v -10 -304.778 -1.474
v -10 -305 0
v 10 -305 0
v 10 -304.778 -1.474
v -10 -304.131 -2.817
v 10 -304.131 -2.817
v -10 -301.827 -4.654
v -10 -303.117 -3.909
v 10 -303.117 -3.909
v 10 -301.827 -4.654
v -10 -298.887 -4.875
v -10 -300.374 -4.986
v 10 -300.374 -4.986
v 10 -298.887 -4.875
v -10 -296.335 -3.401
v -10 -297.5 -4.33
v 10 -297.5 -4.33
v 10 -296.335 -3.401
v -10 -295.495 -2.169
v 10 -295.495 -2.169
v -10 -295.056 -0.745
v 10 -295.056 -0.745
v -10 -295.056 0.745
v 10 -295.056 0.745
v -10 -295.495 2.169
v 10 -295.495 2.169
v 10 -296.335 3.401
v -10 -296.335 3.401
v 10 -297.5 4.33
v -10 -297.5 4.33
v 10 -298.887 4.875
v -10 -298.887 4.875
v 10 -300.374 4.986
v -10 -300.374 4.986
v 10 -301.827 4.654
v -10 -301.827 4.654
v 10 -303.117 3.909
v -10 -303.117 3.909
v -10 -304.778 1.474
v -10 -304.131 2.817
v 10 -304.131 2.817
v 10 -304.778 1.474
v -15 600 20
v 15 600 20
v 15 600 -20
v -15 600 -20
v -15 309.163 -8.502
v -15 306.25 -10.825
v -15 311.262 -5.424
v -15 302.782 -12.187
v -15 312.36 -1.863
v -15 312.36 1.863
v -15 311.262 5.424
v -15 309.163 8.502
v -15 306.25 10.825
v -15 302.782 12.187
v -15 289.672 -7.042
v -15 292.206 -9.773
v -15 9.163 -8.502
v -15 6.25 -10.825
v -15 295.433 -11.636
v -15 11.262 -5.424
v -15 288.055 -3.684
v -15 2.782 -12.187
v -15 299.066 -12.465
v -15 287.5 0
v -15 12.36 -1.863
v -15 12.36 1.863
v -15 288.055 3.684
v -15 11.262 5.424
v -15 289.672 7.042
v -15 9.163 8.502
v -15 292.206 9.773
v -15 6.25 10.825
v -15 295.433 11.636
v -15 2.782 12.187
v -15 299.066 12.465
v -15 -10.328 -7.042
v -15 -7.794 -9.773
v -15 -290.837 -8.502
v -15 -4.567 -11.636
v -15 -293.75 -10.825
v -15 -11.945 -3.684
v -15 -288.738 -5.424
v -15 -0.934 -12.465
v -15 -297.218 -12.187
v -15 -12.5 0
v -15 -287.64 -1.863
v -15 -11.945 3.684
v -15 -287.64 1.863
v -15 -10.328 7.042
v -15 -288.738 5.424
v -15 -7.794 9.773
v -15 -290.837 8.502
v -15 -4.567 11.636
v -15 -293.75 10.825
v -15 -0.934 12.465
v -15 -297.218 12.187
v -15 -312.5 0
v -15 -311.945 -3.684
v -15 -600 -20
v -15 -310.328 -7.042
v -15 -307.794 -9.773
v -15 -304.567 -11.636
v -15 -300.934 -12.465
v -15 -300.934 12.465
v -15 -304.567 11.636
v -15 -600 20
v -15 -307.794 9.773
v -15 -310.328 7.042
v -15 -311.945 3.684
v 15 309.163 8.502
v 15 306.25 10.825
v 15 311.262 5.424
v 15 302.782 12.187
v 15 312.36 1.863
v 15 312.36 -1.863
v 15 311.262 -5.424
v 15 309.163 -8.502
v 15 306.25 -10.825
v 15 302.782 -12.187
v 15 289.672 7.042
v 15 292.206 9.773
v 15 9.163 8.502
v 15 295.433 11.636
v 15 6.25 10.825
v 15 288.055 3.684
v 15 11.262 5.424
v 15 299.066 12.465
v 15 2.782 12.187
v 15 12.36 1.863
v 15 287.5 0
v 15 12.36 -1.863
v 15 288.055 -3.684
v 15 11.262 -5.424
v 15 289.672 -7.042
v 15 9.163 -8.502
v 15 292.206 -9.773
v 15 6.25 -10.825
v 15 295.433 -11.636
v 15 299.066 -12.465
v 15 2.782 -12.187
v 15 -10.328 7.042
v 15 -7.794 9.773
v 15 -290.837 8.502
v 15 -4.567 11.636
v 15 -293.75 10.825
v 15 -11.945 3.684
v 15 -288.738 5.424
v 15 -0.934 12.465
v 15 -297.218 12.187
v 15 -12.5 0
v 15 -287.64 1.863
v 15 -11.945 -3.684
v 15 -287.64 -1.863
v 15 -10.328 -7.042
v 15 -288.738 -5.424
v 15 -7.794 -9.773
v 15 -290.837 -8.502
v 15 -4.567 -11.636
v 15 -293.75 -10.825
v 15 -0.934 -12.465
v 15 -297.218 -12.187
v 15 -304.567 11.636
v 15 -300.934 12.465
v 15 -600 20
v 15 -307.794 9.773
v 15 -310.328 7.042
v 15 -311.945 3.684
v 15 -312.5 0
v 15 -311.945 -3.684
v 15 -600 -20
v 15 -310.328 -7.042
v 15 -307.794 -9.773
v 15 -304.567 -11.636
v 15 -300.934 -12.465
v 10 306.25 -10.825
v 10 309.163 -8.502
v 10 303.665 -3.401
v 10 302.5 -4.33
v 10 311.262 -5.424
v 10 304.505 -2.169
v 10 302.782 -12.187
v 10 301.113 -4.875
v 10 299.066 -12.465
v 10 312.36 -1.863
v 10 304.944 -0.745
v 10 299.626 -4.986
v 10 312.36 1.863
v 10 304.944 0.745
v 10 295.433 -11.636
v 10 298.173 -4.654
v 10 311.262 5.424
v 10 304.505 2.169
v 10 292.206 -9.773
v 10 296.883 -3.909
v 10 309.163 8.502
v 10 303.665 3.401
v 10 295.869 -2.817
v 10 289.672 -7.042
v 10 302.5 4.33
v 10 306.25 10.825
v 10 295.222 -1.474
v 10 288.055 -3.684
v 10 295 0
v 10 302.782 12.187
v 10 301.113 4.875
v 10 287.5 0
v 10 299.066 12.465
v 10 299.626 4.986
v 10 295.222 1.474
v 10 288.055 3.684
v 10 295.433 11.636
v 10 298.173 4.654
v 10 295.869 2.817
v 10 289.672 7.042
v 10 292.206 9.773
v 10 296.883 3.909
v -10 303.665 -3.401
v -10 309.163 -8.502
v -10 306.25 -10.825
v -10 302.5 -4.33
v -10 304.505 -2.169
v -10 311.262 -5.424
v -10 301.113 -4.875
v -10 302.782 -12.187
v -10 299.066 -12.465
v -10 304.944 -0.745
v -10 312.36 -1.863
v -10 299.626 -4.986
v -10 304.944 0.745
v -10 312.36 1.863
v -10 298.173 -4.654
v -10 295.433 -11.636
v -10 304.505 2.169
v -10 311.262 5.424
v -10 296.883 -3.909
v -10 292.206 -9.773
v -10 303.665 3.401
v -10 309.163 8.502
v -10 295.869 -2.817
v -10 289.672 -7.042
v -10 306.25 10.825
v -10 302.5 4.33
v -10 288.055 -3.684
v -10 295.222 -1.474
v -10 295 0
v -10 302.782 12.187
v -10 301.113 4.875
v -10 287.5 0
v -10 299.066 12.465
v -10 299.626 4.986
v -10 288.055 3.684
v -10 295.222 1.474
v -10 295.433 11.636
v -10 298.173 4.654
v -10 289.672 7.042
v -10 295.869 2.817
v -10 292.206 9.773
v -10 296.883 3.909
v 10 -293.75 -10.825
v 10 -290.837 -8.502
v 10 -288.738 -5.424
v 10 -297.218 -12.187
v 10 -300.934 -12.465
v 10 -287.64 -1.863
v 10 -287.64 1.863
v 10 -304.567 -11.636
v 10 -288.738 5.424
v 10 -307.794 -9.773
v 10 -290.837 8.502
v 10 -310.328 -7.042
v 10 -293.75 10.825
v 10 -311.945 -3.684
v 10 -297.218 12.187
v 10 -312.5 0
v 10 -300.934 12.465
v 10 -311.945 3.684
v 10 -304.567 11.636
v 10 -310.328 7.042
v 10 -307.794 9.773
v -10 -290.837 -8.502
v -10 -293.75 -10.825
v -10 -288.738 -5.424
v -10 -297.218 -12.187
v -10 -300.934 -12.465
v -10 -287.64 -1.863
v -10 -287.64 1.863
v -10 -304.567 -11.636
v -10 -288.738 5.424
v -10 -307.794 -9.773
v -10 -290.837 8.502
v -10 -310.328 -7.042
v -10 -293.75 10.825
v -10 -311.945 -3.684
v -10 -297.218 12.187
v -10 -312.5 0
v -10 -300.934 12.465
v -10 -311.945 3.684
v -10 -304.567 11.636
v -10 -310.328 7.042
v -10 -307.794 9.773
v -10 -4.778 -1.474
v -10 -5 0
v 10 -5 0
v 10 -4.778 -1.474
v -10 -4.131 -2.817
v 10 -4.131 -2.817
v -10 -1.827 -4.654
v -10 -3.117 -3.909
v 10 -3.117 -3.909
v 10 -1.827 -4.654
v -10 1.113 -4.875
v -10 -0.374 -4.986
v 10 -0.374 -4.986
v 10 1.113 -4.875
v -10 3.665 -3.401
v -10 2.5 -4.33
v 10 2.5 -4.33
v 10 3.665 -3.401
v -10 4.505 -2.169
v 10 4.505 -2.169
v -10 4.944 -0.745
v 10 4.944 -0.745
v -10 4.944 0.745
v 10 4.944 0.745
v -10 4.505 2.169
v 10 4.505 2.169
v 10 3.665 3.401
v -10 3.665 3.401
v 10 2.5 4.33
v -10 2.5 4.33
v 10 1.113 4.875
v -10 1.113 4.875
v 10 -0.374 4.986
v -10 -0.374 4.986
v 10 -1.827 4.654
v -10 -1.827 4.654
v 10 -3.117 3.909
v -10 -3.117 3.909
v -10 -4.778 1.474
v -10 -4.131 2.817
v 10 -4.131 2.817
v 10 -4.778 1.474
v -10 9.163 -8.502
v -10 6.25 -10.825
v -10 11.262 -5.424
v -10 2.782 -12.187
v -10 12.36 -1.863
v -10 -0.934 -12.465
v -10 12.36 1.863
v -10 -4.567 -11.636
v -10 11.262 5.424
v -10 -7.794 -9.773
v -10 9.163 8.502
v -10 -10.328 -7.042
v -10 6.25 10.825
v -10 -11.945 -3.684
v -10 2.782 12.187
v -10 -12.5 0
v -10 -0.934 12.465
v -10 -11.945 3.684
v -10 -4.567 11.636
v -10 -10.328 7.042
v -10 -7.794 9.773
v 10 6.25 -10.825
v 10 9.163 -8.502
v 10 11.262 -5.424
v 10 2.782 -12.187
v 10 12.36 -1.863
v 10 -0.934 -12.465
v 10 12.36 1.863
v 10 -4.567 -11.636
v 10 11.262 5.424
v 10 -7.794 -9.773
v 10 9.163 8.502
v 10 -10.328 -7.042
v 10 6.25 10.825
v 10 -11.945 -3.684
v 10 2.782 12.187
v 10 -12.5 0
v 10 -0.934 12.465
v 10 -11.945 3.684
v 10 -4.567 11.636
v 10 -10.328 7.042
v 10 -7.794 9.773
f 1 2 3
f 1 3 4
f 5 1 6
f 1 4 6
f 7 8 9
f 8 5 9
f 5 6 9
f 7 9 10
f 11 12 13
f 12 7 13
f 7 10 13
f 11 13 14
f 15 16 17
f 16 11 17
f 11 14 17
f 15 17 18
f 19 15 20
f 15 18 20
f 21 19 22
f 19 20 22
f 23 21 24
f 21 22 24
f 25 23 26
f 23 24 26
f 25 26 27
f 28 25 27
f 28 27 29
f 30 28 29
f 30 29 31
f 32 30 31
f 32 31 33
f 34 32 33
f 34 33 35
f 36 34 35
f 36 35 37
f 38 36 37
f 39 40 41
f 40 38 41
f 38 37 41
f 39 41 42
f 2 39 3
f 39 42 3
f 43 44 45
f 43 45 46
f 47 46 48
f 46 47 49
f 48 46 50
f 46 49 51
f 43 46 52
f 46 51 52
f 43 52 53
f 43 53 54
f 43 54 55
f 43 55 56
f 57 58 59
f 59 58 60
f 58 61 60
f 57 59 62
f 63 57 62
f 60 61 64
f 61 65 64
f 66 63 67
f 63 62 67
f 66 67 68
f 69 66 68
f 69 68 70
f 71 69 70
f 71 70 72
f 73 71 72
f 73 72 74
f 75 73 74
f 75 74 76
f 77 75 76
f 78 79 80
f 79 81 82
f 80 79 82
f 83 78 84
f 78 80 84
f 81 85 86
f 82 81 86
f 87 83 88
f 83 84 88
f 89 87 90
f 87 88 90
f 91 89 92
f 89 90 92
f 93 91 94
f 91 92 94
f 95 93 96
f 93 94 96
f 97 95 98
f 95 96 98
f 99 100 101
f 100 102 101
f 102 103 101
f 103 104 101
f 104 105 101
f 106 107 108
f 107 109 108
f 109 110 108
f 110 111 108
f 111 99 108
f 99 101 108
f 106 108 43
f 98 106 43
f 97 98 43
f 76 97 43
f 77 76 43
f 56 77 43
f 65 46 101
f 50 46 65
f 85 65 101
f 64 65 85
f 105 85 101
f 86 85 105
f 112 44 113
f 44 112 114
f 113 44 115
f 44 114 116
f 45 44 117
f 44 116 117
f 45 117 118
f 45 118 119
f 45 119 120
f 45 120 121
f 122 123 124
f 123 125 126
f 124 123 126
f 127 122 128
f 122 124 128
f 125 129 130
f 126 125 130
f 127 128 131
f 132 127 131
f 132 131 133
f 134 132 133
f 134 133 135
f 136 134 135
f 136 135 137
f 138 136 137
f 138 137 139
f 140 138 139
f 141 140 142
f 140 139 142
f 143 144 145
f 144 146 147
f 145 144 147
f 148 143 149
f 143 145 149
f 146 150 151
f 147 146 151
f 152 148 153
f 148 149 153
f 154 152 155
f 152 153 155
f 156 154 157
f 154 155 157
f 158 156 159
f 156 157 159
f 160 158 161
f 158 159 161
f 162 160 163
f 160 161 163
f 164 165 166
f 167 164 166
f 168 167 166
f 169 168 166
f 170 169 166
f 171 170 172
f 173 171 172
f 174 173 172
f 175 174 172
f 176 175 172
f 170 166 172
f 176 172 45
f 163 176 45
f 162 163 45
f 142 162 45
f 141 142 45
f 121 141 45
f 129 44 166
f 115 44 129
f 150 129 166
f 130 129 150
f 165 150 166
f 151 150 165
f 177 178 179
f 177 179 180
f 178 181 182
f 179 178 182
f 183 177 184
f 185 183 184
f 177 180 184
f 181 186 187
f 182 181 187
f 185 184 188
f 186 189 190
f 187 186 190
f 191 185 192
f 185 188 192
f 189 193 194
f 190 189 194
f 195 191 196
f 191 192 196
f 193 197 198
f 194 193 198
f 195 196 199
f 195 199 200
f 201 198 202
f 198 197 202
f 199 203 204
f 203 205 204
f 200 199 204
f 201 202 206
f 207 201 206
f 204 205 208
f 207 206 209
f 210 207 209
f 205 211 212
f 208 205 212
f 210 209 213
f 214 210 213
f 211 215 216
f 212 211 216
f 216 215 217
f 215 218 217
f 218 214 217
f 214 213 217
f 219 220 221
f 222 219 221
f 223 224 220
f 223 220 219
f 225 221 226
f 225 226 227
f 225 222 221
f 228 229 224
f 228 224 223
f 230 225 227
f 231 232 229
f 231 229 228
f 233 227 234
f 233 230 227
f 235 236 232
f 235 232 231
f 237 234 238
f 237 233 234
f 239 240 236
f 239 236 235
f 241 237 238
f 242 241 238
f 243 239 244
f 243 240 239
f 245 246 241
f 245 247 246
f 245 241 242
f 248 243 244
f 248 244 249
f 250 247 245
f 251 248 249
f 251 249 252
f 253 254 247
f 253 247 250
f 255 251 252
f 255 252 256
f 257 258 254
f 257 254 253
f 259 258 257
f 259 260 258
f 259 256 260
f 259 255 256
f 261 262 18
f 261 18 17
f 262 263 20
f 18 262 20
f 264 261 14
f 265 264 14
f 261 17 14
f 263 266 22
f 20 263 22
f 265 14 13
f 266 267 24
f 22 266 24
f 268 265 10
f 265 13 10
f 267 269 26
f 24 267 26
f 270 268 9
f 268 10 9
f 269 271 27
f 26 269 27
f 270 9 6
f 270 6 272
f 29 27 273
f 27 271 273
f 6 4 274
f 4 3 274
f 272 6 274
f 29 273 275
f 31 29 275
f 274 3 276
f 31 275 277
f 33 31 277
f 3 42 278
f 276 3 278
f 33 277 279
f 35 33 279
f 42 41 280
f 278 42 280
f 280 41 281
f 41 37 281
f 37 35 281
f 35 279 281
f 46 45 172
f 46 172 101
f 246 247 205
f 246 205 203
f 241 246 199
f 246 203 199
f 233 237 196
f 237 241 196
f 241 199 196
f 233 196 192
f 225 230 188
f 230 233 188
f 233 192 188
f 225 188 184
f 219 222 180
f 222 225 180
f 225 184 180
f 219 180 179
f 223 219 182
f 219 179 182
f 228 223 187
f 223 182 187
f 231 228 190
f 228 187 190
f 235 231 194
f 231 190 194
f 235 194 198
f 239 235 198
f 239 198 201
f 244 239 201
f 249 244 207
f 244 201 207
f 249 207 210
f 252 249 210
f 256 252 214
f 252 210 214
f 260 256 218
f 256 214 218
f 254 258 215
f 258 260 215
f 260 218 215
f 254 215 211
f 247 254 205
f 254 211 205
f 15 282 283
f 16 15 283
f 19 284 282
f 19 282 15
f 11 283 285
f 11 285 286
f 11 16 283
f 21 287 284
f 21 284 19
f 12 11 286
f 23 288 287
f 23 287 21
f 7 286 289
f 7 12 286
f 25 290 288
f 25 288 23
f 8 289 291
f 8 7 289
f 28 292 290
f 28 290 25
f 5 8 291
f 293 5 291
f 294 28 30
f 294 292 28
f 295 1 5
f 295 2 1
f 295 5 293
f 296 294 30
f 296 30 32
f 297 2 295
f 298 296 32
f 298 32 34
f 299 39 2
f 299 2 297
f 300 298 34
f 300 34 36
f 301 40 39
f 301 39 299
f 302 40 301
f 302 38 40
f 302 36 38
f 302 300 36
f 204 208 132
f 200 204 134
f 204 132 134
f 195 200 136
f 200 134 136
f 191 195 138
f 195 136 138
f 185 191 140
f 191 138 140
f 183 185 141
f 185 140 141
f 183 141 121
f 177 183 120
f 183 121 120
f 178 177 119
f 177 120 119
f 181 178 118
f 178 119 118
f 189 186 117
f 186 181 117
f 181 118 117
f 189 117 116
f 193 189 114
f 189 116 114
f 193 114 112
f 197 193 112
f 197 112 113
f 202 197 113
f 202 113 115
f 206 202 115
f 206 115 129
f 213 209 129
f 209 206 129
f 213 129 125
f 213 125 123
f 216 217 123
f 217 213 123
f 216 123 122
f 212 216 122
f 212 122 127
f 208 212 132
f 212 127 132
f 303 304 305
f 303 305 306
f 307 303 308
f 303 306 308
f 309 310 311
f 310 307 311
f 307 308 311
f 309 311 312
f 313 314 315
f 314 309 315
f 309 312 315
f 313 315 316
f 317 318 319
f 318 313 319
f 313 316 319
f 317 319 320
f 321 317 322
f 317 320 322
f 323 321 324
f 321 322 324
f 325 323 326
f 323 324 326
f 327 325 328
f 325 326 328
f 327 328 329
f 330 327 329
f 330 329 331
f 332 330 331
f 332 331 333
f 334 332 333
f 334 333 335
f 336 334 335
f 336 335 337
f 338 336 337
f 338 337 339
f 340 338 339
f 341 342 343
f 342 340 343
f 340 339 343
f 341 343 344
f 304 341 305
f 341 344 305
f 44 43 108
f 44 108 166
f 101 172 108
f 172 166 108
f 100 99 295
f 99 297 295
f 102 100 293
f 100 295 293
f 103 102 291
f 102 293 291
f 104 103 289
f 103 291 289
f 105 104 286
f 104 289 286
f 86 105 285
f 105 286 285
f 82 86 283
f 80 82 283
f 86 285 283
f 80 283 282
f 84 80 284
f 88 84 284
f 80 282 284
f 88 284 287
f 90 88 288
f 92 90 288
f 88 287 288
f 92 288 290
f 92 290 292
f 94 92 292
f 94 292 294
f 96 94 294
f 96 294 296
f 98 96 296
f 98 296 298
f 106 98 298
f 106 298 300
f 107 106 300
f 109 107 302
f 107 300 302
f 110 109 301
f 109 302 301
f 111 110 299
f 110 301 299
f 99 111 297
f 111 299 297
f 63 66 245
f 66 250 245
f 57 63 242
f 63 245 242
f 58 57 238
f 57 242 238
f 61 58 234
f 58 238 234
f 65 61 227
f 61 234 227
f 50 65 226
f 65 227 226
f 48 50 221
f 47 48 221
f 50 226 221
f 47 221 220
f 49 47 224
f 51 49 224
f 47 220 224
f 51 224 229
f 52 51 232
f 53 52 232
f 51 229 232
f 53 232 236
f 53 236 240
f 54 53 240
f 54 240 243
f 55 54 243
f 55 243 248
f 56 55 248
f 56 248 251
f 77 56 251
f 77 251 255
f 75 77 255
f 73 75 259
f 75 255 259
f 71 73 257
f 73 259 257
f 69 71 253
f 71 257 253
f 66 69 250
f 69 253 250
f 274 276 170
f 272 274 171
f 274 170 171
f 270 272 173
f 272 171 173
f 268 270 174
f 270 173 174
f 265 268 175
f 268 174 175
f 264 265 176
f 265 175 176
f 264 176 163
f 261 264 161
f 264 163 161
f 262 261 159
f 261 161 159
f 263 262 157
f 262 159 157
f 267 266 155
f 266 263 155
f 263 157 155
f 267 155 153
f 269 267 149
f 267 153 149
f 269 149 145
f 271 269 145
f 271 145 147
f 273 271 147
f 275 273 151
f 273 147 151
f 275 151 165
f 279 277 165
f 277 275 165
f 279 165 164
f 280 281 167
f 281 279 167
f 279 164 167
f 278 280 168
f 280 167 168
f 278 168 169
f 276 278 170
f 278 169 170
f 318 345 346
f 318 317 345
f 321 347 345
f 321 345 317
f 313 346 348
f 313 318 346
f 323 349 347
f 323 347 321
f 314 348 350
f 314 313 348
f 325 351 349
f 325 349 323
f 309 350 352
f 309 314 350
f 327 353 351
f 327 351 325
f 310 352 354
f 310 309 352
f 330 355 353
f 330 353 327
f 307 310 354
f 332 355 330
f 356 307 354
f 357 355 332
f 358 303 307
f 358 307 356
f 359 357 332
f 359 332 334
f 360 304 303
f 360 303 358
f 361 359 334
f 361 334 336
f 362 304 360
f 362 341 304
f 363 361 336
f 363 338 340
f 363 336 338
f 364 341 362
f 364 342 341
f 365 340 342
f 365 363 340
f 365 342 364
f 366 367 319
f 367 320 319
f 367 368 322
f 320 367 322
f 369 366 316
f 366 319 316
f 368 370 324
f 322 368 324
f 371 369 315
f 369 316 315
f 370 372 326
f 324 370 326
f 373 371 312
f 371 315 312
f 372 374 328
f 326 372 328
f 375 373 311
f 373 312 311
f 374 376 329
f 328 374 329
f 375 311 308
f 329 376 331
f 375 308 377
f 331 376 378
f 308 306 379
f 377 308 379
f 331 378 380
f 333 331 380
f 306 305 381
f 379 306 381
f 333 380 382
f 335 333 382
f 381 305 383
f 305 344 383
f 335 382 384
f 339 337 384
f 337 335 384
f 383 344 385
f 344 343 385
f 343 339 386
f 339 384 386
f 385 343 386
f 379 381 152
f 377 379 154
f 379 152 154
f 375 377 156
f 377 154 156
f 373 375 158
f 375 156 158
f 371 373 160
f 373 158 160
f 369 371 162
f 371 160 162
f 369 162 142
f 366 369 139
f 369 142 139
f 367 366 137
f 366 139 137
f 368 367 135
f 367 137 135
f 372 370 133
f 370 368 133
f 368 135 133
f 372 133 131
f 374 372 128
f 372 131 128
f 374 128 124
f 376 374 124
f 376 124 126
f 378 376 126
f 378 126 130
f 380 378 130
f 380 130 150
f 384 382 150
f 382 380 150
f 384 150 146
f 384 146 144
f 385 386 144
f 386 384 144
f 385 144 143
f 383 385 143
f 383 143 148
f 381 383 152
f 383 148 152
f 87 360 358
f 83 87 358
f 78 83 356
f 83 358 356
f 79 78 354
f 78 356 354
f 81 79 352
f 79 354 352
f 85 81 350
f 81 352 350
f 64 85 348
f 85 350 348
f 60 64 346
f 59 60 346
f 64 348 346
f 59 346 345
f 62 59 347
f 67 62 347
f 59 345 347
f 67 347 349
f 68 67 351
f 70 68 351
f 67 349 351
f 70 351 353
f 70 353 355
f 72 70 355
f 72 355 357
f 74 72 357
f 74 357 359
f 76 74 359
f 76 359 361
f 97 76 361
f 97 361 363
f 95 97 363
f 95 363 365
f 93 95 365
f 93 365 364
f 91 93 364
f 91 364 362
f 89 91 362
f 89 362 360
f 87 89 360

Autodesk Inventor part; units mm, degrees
ref_plane "YZ Plane" through (0, 0, 0) normal (1, 0, 0) x (0, 1, 0)
ref_plane "XZ Plane" through (0, 0, 0) normal (0, 1, 0) x (-1, 0, 0)
ref_plane "XY Plane" through (0, 0, 0) normal (0, 0, 1) x (1, 0, 0)
sketch "Sketch1" plane through (0, 0, 0) normal (0, 1, 0) x (-1, 0, 0)
  line L0 (15, 20) -> (-15, 20)
  line L1 (-15, 20) -> (-15, -20)
  line L2 (-15, -20) -> (15, -20)
  line L3 (15, -20) -> (15, 20)
  point P0 (0, 0)
  point P1 (15, 0)
  point P2 (0, -20)
  dimension "d0" = 40
  dimension "d1" = 30
extrude "Extrusion1" add sketch "Sketch1" along normal mid plane 1200
sketch "Sketch2" plane through (0, 0, 0) normal (0, 0, 1) x (1, 0, 0)
  line L0 (35, 0) -> (-35, 0)
  line L1 (-35, 0) -> (-35, -12.5)
  line L2 (-35, -12.5) -> (-10, -12.5)
  line L3 (-10, -12.5) -> (-10, -5)
  line L4 (-10, -5) -> (10, -5)
  line L5 (10, -5) -> (10, -12.5)
  line L6 (10, -12.5) -> (35, -12.5)
  line L7 (35, -12.5) -> (35, 0)
  point P0 (0, 0)
  point P1 (0, 0)
  dimension "d4" = 10
  dimension "d5" = 70
  dimension "d6" = 25
  dimension "d7" = 20
revolve "Revolution1" cut sketch "Sketch2" angle 360 about axis through (35, 0, 0) along (-1, 0, 0)
pattern_linear "Rectangular Pattern1" count 3 spacing 300 along (0, 1, 0) of "Revolution1" first direction both ways yes
